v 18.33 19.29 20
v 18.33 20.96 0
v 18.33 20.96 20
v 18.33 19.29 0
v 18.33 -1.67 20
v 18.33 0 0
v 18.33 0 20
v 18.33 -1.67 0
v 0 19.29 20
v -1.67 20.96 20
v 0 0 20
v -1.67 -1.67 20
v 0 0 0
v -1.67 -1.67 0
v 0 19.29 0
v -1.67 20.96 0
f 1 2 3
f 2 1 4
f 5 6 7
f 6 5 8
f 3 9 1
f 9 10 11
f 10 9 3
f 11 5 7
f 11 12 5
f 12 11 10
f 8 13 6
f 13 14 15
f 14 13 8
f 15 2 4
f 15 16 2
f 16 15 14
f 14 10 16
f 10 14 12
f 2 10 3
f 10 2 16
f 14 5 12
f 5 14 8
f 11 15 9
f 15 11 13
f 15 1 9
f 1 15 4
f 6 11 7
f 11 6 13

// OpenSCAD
wood = 19.19+.1;
twt=1.67;
difference(){
	union(){
		translate([-twt,-twt,0])
			cube([20,wood+2*twt, 20]);
	}
	#translate([0,0,-.1])cube([20, wood, 21]);
}
